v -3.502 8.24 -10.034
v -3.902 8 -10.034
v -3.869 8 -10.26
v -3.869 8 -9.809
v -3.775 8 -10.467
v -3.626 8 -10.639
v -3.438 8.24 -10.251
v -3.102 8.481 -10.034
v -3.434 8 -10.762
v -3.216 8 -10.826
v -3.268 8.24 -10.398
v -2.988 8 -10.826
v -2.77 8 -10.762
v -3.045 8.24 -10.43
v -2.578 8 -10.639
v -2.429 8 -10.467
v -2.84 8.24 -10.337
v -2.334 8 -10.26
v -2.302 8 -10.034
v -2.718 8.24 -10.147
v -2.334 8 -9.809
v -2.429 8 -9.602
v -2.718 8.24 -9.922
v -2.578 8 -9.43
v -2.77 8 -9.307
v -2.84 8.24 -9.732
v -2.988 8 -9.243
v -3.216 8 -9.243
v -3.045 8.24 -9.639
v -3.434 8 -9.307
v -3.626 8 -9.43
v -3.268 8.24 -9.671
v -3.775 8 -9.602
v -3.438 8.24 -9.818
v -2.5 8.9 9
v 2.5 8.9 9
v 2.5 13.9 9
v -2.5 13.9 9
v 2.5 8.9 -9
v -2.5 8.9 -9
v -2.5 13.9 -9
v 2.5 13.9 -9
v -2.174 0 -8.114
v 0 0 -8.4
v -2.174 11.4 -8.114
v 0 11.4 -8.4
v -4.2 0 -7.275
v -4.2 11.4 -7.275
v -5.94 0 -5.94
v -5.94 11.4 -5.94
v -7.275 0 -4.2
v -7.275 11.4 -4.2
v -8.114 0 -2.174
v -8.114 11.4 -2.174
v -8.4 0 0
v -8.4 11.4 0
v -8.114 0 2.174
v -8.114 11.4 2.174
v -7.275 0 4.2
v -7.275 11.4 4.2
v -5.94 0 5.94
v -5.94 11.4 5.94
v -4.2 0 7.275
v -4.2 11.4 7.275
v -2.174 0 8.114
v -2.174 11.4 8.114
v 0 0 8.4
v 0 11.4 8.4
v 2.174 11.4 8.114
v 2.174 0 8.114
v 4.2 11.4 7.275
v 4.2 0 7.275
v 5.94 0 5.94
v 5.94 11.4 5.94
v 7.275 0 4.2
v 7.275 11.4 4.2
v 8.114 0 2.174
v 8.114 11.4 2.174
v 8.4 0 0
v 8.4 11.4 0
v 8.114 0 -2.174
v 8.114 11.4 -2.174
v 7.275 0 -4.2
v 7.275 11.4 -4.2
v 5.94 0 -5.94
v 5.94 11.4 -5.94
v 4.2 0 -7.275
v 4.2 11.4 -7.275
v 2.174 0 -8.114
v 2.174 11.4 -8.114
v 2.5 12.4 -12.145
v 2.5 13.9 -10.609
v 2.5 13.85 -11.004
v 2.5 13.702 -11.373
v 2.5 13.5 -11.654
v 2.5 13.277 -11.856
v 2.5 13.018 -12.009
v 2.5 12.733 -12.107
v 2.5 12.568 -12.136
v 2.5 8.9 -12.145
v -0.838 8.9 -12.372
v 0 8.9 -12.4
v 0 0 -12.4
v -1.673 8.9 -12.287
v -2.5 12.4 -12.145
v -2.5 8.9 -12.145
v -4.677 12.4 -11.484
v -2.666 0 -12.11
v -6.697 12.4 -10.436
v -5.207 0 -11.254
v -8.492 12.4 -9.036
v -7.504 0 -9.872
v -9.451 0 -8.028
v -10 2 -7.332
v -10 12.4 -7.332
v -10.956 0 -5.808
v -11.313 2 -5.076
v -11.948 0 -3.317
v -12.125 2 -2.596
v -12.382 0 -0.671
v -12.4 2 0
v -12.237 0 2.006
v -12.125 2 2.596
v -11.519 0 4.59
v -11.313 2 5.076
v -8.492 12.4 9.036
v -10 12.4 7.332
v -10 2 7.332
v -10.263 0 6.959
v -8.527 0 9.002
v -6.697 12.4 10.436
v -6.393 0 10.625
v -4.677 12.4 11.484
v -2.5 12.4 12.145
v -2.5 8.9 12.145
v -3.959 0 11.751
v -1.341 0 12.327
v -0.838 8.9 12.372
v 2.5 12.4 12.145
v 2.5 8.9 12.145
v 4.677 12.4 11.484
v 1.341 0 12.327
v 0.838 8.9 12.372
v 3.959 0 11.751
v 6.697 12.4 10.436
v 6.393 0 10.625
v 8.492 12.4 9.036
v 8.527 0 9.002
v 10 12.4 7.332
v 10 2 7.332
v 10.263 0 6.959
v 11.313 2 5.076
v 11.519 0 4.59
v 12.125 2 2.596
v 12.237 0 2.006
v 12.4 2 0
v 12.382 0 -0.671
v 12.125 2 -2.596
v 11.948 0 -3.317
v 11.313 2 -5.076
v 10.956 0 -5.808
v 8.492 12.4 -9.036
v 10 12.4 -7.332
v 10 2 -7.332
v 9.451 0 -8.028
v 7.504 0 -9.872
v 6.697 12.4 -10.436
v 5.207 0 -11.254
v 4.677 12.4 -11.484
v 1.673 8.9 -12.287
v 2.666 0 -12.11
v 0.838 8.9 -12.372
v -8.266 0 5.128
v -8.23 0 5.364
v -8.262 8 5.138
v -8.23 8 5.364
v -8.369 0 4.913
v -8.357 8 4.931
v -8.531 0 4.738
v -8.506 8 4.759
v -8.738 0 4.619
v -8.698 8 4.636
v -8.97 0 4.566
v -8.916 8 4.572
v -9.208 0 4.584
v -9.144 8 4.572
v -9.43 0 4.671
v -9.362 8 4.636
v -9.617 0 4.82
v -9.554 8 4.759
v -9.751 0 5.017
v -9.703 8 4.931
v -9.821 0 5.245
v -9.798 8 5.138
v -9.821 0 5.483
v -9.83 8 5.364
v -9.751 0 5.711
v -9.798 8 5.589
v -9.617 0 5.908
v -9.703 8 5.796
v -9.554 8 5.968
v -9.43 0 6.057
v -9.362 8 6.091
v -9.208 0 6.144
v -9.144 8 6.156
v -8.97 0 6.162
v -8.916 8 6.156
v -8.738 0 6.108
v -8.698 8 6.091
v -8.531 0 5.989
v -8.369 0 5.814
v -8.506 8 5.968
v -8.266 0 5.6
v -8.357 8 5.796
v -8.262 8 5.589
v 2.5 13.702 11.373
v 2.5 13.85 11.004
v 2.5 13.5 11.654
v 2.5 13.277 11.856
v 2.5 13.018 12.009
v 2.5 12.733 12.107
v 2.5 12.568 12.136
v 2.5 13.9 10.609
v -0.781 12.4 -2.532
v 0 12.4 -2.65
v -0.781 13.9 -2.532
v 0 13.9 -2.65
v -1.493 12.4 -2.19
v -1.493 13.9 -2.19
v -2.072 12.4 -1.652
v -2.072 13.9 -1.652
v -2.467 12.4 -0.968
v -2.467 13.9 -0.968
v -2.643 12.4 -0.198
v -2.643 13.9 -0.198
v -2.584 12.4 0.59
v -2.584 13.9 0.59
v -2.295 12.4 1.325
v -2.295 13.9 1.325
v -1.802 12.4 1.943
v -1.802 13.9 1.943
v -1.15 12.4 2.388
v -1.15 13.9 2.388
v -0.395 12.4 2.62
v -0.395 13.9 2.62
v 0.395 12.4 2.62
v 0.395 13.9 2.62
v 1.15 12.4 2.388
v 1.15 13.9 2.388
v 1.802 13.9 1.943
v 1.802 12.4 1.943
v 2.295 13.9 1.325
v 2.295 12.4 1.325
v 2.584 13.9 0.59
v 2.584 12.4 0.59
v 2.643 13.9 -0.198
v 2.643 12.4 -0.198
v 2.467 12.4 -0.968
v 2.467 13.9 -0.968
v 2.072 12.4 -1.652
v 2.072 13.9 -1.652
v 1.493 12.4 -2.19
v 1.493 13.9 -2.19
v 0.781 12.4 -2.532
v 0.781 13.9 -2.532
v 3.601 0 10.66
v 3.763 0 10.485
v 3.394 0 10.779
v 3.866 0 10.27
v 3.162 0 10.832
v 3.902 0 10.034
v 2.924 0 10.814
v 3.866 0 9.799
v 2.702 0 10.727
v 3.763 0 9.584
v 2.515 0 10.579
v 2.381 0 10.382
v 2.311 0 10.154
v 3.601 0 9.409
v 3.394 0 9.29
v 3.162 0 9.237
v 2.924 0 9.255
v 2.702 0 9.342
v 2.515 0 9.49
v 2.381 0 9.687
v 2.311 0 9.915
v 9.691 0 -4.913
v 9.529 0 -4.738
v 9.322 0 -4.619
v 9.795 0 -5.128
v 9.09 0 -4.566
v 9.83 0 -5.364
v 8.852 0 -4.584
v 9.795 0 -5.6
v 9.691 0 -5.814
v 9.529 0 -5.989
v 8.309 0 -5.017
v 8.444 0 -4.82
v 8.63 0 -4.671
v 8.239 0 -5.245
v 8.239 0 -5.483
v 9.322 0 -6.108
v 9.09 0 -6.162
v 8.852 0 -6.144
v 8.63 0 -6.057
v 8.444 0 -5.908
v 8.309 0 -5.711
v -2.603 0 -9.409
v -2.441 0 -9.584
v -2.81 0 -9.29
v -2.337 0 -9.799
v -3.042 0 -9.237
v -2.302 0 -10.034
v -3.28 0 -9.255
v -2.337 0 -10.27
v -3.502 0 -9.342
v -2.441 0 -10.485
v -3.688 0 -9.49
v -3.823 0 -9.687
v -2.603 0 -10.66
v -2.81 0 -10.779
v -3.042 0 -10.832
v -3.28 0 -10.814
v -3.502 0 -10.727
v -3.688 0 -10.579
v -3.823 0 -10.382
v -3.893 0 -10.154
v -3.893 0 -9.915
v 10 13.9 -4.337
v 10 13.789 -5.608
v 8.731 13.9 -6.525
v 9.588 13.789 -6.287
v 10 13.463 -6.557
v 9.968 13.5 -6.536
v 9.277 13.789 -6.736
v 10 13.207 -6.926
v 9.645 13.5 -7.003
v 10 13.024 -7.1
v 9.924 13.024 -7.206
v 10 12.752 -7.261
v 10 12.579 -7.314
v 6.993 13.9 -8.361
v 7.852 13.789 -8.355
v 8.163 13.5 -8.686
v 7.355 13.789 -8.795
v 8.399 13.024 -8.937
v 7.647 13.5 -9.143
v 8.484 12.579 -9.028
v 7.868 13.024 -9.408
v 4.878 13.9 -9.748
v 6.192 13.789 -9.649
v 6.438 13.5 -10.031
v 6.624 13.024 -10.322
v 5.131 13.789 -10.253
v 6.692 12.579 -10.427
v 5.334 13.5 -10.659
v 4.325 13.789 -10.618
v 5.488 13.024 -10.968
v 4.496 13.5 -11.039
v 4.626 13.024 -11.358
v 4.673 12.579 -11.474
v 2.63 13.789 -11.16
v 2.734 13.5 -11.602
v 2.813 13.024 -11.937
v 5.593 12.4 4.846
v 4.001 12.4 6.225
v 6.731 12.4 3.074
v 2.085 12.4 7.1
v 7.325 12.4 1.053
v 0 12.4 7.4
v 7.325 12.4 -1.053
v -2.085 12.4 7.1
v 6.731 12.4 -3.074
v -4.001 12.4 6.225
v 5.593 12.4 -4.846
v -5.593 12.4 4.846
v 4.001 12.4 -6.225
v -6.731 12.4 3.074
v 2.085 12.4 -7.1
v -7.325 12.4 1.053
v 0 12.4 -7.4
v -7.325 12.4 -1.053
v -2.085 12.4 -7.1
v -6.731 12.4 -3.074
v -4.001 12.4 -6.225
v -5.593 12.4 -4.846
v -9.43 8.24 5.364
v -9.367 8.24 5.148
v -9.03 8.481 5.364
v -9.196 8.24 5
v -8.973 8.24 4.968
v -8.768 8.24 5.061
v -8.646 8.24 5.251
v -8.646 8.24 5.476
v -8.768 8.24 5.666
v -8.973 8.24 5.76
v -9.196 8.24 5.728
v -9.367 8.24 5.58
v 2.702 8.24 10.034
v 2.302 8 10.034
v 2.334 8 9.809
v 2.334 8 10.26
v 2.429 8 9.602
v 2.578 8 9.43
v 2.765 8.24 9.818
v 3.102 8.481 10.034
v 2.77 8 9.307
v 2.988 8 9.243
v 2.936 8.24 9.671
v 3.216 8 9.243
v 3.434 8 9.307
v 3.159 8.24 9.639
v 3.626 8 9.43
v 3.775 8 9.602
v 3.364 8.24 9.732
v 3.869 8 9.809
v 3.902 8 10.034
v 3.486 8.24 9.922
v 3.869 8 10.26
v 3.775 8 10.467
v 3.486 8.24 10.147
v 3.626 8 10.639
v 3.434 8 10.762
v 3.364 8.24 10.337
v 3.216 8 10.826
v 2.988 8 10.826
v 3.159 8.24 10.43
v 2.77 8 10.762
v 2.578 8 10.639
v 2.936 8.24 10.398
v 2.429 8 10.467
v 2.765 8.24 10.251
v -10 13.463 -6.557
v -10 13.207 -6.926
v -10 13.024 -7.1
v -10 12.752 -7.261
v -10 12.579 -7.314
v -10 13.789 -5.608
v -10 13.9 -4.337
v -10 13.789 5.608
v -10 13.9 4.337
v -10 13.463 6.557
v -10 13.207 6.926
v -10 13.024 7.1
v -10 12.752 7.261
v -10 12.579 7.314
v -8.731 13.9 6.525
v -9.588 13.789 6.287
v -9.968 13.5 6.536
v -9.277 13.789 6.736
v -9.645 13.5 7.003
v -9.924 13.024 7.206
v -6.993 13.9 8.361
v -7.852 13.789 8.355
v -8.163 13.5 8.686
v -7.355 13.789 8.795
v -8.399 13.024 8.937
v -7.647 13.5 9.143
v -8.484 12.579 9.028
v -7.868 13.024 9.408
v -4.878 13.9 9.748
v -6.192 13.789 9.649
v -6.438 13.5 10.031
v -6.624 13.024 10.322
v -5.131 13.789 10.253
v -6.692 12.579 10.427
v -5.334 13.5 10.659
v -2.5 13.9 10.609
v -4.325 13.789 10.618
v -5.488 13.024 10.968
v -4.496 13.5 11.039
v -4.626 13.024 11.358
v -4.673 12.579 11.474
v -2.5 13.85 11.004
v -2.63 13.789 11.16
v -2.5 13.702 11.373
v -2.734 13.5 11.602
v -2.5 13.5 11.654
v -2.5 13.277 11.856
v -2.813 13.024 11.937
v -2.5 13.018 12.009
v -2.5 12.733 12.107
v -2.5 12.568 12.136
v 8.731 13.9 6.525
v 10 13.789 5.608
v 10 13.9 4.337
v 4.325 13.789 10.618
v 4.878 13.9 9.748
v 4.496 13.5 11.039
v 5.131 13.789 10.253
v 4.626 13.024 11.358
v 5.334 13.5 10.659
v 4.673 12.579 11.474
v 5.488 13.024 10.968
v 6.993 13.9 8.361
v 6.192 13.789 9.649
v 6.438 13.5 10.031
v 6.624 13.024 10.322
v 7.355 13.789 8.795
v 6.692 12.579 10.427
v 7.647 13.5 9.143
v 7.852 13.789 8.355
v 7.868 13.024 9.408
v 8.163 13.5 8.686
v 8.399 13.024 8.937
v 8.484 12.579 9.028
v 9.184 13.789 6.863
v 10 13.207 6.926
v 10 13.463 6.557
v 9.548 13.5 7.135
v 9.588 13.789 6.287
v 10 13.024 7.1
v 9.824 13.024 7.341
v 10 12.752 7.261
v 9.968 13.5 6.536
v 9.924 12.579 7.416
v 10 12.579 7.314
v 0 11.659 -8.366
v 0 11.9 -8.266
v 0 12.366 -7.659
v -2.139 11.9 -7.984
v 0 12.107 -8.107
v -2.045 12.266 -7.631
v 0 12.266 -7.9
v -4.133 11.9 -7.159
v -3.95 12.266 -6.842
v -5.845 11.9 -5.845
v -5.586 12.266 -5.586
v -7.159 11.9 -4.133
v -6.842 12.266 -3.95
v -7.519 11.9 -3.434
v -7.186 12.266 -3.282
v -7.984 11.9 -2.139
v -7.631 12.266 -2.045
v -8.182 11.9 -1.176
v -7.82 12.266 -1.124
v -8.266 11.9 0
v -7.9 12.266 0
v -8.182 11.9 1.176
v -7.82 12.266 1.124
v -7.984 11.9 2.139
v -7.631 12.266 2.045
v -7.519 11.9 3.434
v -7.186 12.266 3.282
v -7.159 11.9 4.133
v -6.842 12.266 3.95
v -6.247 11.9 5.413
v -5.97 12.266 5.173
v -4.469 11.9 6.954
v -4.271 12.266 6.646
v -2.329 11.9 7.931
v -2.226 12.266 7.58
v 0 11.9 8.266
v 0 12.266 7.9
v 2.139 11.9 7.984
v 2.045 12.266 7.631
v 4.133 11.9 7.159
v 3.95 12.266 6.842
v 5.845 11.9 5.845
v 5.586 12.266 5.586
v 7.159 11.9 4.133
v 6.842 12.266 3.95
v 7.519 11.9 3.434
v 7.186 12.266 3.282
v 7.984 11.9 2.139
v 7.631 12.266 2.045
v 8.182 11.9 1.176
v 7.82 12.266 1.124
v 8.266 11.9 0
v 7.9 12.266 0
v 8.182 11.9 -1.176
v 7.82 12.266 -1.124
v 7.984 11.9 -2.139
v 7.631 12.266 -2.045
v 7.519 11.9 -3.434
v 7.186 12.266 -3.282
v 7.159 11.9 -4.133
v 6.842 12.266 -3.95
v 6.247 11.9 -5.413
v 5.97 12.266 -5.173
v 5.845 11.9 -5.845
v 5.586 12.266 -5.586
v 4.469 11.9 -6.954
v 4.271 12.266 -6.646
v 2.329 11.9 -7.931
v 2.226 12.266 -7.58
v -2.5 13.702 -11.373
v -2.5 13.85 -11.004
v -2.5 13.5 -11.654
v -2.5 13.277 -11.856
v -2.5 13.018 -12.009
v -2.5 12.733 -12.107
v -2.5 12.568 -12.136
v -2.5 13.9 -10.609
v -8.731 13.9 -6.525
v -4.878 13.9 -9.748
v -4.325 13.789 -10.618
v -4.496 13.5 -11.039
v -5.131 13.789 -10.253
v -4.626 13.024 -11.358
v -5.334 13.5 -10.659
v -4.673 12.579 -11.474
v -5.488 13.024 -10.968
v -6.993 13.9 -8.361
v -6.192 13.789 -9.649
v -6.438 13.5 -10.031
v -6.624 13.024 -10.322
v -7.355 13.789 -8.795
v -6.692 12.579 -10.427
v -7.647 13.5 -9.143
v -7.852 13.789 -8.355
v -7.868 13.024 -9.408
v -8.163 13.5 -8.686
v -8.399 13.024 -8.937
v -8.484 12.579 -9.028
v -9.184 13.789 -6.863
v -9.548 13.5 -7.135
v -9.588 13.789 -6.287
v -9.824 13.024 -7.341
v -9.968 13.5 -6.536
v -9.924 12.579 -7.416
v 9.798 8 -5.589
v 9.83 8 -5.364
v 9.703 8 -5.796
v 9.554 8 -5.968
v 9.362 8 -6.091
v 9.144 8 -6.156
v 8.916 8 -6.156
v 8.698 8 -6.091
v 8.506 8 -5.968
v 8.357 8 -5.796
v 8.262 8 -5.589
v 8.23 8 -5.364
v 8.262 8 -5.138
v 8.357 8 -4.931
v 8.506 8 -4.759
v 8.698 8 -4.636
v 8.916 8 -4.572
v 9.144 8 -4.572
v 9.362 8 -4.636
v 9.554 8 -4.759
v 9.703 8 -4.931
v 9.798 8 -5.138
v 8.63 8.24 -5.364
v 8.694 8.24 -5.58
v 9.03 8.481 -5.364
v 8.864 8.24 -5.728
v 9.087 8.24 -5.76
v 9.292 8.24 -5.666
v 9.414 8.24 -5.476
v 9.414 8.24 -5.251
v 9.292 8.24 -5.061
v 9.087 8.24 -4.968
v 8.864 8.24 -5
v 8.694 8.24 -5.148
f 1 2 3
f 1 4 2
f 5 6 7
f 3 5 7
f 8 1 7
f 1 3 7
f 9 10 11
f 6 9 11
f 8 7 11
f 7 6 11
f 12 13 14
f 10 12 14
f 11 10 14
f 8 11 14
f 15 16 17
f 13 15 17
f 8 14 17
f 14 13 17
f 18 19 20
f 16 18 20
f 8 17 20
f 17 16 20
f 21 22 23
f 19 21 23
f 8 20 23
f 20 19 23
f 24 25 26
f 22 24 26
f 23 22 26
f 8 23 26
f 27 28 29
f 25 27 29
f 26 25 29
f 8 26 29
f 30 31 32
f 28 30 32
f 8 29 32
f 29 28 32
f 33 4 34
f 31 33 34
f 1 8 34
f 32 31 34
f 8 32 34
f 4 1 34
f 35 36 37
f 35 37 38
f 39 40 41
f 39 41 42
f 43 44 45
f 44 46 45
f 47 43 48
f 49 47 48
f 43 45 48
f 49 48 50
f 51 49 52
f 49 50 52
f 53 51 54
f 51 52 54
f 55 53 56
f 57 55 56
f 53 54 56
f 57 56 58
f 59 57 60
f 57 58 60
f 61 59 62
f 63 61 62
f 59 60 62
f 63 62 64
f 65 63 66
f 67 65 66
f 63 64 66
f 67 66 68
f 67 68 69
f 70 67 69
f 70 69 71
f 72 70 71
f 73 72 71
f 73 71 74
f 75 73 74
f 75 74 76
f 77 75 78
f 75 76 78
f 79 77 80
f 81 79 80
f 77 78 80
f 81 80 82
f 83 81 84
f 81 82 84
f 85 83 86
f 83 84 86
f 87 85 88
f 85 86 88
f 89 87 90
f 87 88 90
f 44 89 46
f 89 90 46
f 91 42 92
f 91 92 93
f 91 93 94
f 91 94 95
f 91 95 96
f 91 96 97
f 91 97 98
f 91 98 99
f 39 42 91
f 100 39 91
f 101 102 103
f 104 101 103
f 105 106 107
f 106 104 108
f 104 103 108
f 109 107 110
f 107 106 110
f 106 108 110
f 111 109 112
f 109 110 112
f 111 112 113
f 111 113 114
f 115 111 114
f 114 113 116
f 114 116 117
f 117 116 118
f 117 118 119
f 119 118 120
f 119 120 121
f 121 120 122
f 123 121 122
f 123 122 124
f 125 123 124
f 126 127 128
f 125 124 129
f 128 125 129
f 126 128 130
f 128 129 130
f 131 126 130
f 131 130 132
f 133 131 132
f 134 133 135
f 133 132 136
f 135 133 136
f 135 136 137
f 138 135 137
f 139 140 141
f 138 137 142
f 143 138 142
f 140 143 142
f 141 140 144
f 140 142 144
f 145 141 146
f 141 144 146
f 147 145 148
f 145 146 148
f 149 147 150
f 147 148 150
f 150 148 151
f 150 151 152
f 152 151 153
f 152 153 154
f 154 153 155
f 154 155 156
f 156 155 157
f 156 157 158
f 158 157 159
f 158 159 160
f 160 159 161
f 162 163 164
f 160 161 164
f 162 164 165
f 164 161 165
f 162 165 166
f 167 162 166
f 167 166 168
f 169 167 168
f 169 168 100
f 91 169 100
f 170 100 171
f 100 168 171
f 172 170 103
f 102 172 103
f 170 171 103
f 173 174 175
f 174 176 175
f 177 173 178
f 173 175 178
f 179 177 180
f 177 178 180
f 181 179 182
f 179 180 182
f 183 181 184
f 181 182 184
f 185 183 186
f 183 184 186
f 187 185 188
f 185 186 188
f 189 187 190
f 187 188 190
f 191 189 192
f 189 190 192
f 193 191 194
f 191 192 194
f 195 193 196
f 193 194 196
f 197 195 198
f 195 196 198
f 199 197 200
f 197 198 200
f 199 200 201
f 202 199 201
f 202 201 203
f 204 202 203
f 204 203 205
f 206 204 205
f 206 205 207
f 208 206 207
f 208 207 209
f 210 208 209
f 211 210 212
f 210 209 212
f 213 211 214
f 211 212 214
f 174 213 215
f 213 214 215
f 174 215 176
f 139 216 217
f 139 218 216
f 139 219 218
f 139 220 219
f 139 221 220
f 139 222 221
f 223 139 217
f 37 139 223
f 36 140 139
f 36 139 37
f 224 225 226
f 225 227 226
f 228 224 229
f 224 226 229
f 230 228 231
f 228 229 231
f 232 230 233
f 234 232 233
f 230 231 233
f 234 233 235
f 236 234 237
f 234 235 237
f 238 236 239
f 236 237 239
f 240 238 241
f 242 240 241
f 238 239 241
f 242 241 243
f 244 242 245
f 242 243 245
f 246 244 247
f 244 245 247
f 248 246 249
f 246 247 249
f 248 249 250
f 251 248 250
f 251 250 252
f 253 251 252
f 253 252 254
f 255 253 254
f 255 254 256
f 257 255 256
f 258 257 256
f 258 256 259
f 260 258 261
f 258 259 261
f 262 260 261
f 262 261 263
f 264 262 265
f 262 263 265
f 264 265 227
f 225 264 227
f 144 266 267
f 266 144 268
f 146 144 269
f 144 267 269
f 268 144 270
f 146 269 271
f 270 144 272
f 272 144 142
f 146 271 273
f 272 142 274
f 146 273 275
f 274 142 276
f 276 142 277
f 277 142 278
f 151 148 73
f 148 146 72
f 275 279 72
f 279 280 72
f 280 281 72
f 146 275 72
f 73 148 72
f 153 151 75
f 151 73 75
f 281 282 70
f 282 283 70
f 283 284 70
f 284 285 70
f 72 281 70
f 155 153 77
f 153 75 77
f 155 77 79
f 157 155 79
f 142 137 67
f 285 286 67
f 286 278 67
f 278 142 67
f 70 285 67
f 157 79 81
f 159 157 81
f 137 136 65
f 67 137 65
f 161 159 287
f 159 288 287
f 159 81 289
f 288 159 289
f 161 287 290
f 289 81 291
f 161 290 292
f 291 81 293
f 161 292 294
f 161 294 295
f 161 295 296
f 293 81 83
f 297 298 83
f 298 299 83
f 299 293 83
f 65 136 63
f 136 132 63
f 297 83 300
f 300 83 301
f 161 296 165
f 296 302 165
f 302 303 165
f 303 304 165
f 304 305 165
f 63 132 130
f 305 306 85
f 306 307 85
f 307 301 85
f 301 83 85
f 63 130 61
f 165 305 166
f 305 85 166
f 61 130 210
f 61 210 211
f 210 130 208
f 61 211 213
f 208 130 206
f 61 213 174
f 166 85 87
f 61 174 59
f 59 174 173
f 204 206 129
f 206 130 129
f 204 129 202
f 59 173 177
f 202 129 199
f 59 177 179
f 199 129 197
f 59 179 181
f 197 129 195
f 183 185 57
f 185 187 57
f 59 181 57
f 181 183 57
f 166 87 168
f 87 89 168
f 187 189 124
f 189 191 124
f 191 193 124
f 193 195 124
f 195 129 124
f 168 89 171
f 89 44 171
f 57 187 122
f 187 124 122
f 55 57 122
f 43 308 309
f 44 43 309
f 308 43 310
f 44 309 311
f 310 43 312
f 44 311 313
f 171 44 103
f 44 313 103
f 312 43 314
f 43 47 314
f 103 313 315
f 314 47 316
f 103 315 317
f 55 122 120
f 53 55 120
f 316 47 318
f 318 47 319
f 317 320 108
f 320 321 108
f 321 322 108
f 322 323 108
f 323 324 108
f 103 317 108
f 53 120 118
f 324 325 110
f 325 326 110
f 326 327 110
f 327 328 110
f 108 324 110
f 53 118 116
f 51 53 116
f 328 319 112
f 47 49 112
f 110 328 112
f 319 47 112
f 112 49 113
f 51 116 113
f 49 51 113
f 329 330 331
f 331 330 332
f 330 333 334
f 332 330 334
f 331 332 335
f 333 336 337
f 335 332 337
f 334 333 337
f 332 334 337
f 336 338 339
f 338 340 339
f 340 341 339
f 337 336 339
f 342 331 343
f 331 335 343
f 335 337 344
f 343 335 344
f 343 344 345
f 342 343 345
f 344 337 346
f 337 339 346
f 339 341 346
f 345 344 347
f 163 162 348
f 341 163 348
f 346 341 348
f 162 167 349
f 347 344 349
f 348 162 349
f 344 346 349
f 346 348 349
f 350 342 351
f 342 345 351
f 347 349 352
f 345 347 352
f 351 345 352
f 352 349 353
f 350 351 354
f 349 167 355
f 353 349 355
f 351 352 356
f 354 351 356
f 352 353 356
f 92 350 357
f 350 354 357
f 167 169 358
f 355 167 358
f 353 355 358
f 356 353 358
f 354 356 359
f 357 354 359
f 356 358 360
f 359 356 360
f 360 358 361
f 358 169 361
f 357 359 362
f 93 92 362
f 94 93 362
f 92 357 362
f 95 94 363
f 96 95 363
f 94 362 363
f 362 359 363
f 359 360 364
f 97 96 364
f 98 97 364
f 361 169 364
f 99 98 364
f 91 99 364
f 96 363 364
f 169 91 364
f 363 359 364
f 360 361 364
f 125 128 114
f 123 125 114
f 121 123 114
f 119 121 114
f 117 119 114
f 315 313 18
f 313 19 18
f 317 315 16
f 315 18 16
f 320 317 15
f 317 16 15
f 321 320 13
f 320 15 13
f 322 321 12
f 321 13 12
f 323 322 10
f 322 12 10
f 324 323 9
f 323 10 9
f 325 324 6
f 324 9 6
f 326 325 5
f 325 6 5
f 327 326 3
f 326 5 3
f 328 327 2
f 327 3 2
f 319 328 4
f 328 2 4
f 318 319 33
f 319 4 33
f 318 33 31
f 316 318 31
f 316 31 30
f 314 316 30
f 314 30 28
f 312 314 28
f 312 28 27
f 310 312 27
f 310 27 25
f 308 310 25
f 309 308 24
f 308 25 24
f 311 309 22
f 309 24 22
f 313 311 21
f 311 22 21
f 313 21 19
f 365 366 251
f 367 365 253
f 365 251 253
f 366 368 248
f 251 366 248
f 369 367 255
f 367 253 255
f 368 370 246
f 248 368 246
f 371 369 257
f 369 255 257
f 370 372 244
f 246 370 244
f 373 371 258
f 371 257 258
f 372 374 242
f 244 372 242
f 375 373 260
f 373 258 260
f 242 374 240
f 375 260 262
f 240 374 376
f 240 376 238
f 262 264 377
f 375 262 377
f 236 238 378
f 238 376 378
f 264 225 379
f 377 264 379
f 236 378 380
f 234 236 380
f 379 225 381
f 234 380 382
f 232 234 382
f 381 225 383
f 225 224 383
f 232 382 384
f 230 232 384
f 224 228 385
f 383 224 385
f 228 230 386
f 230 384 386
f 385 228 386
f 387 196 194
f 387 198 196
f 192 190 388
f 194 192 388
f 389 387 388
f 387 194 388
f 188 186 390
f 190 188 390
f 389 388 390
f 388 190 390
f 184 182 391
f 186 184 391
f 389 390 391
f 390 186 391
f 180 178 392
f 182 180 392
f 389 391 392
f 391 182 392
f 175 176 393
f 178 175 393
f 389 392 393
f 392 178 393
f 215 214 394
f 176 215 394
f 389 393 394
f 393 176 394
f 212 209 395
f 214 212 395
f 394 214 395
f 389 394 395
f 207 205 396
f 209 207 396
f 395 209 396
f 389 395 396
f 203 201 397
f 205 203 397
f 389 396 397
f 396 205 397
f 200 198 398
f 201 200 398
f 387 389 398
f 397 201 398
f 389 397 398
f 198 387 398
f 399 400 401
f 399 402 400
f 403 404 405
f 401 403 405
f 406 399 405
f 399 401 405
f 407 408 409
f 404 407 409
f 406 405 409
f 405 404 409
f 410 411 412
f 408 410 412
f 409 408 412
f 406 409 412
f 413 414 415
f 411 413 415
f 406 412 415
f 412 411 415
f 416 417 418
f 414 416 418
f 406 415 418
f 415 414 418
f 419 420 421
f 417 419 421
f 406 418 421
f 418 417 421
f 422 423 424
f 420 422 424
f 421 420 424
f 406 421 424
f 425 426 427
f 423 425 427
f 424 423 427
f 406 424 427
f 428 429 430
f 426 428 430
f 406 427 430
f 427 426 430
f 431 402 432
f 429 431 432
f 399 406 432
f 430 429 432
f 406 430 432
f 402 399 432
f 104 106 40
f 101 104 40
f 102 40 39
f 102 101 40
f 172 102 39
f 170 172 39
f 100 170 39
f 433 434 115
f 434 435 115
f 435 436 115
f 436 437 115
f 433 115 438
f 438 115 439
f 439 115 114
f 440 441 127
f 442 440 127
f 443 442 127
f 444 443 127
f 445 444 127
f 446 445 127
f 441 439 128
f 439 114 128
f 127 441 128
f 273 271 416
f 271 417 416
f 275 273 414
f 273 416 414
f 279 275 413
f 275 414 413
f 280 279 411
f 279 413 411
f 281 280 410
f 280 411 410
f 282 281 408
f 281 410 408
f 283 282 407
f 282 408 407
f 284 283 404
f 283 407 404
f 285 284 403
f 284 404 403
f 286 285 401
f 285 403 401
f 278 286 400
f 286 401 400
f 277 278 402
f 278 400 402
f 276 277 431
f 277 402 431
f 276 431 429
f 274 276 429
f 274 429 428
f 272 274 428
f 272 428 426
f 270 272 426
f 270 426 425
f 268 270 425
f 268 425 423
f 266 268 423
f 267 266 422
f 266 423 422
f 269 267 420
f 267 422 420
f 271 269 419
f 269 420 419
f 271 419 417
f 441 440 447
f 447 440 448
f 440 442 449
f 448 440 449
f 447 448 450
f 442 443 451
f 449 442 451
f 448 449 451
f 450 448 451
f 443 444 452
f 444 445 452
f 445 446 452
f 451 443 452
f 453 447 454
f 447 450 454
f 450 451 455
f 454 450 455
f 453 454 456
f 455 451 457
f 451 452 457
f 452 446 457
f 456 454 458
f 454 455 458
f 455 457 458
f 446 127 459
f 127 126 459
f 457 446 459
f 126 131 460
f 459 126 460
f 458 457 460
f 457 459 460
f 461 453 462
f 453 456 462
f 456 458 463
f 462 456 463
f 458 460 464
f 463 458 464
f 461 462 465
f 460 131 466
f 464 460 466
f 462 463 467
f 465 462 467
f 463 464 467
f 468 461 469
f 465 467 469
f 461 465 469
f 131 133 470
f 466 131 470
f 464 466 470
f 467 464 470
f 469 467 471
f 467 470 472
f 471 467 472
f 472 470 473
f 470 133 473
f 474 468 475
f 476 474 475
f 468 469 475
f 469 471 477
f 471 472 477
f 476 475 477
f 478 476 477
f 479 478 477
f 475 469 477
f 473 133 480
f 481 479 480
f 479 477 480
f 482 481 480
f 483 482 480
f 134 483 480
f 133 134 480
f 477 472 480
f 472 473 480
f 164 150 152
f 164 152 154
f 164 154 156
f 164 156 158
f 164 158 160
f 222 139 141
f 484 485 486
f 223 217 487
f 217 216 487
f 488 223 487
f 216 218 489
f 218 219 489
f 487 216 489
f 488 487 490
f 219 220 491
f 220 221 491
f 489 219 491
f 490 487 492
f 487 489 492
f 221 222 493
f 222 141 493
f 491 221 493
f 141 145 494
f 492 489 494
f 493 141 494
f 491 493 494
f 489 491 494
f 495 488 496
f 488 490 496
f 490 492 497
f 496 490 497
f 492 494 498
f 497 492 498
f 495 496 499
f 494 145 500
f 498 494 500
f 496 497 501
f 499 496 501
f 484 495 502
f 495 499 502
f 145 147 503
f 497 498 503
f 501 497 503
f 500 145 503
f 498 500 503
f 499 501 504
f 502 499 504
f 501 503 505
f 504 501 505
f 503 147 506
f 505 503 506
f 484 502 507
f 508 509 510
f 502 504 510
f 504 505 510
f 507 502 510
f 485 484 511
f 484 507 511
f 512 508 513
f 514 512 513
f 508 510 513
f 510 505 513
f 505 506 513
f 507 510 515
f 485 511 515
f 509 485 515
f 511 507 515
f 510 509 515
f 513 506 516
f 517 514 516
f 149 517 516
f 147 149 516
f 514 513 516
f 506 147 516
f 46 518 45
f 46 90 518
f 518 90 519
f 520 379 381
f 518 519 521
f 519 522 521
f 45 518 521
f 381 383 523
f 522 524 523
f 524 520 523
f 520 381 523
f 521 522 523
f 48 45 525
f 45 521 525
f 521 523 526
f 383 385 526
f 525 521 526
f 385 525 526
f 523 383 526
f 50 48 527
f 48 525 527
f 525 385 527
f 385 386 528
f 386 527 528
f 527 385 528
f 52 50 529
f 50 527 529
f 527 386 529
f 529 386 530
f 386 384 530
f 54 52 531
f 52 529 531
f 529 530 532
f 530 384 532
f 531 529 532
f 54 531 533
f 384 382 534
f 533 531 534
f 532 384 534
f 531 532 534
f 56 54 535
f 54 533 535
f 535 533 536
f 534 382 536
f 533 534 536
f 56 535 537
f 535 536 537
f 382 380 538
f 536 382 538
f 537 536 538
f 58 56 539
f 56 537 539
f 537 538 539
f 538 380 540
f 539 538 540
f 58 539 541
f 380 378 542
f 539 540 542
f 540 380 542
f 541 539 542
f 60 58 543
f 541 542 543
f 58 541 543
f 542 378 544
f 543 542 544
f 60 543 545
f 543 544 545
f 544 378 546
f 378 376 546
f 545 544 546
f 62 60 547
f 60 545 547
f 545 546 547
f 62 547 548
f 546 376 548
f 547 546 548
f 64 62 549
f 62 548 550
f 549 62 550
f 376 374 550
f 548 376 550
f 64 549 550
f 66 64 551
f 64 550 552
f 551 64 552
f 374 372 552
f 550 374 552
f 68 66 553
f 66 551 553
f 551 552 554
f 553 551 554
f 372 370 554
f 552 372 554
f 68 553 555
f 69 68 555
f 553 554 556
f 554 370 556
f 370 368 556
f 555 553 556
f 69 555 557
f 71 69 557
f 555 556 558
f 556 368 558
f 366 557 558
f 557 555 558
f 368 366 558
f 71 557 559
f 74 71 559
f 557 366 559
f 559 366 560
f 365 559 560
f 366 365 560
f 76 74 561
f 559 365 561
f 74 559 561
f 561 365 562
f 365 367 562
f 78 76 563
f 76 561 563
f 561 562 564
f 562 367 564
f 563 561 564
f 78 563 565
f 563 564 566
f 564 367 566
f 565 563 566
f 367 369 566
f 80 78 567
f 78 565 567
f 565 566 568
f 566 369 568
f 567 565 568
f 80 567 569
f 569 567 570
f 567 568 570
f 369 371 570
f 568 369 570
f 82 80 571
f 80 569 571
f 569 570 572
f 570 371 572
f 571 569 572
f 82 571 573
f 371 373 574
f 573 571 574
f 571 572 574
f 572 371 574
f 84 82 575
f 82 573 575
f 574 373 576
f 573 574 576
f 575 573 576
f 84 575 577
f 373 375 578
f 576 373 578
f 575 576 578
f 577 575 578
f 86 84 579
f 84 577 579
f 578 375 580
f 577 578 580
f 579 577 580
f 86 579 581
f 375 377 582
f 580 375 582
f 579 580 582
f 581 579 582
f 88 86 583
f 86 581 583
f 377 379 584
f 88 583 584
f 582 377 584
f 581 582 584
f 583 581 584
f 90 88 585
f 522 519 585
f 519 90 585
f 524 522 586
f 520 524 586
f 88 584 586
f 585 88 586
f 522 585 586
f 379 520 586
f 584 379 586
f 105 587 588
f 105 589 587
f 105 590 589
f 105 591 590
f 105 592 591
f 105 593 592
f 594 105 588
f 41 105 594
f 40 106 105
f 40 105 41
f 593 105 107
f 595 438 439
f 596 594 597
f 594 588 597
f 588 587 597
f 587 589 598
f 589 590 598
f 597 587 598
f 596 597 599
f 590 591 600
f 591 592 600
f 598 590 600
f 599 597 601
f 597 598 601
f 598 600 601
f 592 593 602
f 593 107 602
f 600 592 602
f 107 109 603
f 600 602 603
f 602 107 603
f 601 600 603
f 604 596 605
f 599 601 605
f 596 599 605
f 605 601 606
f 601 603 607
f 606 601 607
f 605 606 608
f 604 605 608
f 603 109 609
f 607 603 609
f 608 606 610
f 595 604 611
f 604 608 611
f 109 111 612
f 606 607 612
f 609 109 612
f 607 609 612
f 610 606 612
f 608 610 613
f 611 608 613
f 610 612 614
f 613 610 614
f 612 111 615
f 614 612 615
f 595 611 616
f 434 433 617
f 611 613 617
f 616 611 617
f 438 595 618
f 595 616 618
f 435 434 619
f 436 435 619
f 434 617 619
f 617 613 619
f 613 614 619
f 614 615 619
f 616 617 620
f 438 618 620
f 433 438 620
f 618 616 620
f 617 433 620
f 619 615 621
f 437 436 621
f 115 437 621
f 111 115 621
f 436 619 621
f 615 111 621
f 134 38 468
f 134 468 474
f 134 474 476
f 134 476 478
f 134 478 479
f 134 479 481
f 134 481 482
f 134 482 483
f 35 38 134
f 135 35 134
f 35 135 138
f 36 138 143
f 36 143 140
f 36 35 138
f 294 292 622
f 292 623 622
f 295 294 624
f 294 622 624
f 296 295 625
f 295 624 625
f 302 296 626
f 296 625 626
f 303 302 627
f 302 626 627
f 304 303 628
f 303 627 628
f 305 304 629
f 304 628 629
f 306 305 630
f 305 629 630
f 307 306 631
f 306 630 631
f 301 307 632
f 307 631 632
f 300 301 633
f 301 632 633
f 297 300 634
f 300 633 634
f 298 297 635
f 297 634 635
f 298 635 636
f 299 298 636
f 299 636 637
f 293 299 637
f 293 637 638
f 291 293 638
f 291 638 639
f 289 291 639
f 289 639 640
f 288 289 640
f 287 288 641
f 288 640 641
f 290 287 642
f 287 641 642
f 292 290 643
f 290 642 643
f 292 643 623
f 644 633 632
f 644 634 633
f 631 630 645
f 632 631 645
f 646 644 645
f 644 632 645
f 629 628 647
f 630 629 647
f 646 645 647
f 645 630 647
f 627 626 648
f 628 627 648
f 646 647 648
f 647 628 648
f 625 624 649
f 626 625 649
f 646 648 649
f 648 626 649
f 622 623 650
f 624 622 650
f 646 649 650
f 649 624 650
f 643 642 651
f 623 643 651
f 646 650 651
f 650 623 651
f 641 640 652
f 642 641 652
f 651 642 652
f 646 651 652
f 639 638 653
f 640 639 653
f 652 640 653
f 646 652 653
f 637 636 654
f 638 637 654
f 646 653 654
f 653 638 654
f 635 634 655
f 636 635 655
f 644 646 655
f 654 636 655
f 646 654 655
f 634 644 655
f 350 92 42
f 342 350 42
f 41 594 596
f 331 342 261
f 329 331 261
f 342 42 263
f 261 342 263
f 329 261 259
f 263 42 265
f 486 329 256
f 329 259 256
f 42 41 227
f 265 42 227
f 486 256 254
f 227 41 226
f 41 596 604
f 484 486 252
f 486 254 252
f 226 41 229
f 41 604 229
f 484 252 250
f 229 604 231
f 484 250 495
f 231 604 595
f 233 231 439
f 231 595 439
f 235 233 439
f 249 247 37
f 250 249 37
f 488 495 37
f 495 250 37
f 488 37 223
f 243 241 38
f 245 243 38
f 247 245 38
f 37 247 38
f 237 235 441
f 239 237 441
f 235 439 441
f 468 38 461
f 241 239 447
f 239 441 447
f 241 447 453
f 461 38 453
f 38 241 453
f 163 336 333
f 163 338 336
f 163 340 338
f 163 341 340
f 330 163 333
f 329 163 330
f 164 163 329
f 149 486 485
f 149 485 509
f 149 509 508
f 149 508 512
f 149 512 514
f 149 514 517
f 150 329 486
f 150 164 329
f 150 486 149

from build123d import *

# Parameters (mm, degrees)
ENL_V_START                                   = -11.9
ENL_V_MAT_EXTRU_1_DEPTH                       = 11.9
ENL_V_START_2                                 = -5
ENL_V_MAT_EXTRU_2_DEPTH                       = 5
TROU_POUR_TARAUDAGE_POUR_TROU_TARAUD_M2_D     = 1.6
TROU_POUR_TARAUDAGE_POUR_TROU_TARAUD_M2_DEPTH = 8
TROU_POUR_TARAUDAGE_POUR_TROU_TARAUD_M2_TIP   = 0.480688495


with BuildPart() as part:
    # Esquisse1 → Révolution1 (revolve)
    with BuildSketch(Plane.XY, mode=Mode.PRIVATE) as r_volution1_sk:
        with BuildLine():
            Line((-8.4, 0), (-8.4, 11.4))
            ThreePointArc((-8.4, 11.4), (-8.107106781, 12.107106781), (-7.4, 12.4))
            Line((-7.4, 12.4), (-2.65, 12.4))
            Line((-2.65, 12.4), (-2.65, 13.9))
            Line((-2.65, 13.9), (-10.9, 13.9))
            ThreePointArc((-10.9, 13.9), (-11.960660172, 13.460660172), (-12.4, 12.4))
            Line((-12.4, 12.4), (-12.4, 0))
            Line((-12.4, 0), (-8.4, 0))
        make_face()
    revolve(r_volution1_sk.sketch.rotate(Axis((0, -3.661760917, 0), (0, 1, 0)), 270), axis=Axis((0, -3.661760917, 0), (0, 1, 0)))

    # Esquisse2 → Enlèv. mat.-Extru.1 (cut)
    with BuildSketch(Plane(origin=(0, 13.9, 0), x_dir=(1, 0, 0), z_dir=(0, 1, 0)).offset(ENL_V_START)):
        with BuildLine():
            Line((-10, 7.332121112), (-10, -7.332121112))
            ThreePointArc((-10, -7.332121112), (-12.4, 0), (-10, 7.332121112))
        make_face()
        with BuildLine():
            Line((10, 7.332121112), (10, -7.332121112))
            ThreePointArc((10, -7.332121112), (12.4, 0), (10, 7.332121112))
        make_face()
    extrude(amount=ENL_V_MAT_EXTRU_1_DEPTH, mode=Mode.SUBTRACT)

    # Esquisse3 → Enlèv. mat.-Extru.2 (cut)
    with BuildSketch(Plane(origin=(0, 13.9, 0), x_dir=(1, 0, 0), z_dir=(0, 1, 0)).offset(ENL_V_START_2)):
        with BuildLine():
            Line((-2.5, 9), (2.5, 9))
            Line((2.5, 9), (2.5, 12.145369488))
            ThreePointArc((2.5, 12.145369488), (0, 12.4), (-2.5, 12.145369488))
            Line((-2.5, 12.145369488), (-2.5, 9))
        make_face()
        with BuildLine():
            Line((2.5, -12.145369488), (2.5, -9))
            Line((2.5, -9), (-2.5, -9))
            Line((-2.5, -9), (-2.5, -12.145369488))
            ThreePointArc((-2.5, -12.145369488), (0, -12.4), (2.5, -12.145369488))
        make_face()
    extrude(amount=ENL_V_MAT_EXTRU_2_DEPTH, mode=Mode.SUBTRACT)

    # Trou pour taraudage pour trou taraudé M21
    with Locations(Plane(origin=(0, 0, 0), x_dir=(-1, 0, 0), z_dir=(0, -1, 0))):
        with Locations((-3.101869381, -10.034485853), (9.030088198, -5.363767998), (3.101869381, 10.034485853), (-9.030088198, 5.363767998)):
            Hole(TROU_POUR_TARAUDAGE_POUR_TROU_TARAUD_M2_D / 2, depth=TROU_POUR_TARAUDAGE_POUR_TROU_TARAUD_M2_DEPTH)
            with Locations((0, 0, -(TROU_POUR_TARAUDAGE_POUR_TROU_TARAUD_M2_DEPTH + TROU_POUR_TARAUDAGE_POUR_TROU_TARAUD_M2_TIP / 2))):  # 118° drill point
                Cone(0, TROU_POUR_TARAUDAGE_POUR_TROU_TARAUD_M2_D / 2, TROU_POUR_TARAUDAGE_POUR_TROU_TARAUD_M2_TIP, mode=Mode.SUBTRACT)


solid = part.part
